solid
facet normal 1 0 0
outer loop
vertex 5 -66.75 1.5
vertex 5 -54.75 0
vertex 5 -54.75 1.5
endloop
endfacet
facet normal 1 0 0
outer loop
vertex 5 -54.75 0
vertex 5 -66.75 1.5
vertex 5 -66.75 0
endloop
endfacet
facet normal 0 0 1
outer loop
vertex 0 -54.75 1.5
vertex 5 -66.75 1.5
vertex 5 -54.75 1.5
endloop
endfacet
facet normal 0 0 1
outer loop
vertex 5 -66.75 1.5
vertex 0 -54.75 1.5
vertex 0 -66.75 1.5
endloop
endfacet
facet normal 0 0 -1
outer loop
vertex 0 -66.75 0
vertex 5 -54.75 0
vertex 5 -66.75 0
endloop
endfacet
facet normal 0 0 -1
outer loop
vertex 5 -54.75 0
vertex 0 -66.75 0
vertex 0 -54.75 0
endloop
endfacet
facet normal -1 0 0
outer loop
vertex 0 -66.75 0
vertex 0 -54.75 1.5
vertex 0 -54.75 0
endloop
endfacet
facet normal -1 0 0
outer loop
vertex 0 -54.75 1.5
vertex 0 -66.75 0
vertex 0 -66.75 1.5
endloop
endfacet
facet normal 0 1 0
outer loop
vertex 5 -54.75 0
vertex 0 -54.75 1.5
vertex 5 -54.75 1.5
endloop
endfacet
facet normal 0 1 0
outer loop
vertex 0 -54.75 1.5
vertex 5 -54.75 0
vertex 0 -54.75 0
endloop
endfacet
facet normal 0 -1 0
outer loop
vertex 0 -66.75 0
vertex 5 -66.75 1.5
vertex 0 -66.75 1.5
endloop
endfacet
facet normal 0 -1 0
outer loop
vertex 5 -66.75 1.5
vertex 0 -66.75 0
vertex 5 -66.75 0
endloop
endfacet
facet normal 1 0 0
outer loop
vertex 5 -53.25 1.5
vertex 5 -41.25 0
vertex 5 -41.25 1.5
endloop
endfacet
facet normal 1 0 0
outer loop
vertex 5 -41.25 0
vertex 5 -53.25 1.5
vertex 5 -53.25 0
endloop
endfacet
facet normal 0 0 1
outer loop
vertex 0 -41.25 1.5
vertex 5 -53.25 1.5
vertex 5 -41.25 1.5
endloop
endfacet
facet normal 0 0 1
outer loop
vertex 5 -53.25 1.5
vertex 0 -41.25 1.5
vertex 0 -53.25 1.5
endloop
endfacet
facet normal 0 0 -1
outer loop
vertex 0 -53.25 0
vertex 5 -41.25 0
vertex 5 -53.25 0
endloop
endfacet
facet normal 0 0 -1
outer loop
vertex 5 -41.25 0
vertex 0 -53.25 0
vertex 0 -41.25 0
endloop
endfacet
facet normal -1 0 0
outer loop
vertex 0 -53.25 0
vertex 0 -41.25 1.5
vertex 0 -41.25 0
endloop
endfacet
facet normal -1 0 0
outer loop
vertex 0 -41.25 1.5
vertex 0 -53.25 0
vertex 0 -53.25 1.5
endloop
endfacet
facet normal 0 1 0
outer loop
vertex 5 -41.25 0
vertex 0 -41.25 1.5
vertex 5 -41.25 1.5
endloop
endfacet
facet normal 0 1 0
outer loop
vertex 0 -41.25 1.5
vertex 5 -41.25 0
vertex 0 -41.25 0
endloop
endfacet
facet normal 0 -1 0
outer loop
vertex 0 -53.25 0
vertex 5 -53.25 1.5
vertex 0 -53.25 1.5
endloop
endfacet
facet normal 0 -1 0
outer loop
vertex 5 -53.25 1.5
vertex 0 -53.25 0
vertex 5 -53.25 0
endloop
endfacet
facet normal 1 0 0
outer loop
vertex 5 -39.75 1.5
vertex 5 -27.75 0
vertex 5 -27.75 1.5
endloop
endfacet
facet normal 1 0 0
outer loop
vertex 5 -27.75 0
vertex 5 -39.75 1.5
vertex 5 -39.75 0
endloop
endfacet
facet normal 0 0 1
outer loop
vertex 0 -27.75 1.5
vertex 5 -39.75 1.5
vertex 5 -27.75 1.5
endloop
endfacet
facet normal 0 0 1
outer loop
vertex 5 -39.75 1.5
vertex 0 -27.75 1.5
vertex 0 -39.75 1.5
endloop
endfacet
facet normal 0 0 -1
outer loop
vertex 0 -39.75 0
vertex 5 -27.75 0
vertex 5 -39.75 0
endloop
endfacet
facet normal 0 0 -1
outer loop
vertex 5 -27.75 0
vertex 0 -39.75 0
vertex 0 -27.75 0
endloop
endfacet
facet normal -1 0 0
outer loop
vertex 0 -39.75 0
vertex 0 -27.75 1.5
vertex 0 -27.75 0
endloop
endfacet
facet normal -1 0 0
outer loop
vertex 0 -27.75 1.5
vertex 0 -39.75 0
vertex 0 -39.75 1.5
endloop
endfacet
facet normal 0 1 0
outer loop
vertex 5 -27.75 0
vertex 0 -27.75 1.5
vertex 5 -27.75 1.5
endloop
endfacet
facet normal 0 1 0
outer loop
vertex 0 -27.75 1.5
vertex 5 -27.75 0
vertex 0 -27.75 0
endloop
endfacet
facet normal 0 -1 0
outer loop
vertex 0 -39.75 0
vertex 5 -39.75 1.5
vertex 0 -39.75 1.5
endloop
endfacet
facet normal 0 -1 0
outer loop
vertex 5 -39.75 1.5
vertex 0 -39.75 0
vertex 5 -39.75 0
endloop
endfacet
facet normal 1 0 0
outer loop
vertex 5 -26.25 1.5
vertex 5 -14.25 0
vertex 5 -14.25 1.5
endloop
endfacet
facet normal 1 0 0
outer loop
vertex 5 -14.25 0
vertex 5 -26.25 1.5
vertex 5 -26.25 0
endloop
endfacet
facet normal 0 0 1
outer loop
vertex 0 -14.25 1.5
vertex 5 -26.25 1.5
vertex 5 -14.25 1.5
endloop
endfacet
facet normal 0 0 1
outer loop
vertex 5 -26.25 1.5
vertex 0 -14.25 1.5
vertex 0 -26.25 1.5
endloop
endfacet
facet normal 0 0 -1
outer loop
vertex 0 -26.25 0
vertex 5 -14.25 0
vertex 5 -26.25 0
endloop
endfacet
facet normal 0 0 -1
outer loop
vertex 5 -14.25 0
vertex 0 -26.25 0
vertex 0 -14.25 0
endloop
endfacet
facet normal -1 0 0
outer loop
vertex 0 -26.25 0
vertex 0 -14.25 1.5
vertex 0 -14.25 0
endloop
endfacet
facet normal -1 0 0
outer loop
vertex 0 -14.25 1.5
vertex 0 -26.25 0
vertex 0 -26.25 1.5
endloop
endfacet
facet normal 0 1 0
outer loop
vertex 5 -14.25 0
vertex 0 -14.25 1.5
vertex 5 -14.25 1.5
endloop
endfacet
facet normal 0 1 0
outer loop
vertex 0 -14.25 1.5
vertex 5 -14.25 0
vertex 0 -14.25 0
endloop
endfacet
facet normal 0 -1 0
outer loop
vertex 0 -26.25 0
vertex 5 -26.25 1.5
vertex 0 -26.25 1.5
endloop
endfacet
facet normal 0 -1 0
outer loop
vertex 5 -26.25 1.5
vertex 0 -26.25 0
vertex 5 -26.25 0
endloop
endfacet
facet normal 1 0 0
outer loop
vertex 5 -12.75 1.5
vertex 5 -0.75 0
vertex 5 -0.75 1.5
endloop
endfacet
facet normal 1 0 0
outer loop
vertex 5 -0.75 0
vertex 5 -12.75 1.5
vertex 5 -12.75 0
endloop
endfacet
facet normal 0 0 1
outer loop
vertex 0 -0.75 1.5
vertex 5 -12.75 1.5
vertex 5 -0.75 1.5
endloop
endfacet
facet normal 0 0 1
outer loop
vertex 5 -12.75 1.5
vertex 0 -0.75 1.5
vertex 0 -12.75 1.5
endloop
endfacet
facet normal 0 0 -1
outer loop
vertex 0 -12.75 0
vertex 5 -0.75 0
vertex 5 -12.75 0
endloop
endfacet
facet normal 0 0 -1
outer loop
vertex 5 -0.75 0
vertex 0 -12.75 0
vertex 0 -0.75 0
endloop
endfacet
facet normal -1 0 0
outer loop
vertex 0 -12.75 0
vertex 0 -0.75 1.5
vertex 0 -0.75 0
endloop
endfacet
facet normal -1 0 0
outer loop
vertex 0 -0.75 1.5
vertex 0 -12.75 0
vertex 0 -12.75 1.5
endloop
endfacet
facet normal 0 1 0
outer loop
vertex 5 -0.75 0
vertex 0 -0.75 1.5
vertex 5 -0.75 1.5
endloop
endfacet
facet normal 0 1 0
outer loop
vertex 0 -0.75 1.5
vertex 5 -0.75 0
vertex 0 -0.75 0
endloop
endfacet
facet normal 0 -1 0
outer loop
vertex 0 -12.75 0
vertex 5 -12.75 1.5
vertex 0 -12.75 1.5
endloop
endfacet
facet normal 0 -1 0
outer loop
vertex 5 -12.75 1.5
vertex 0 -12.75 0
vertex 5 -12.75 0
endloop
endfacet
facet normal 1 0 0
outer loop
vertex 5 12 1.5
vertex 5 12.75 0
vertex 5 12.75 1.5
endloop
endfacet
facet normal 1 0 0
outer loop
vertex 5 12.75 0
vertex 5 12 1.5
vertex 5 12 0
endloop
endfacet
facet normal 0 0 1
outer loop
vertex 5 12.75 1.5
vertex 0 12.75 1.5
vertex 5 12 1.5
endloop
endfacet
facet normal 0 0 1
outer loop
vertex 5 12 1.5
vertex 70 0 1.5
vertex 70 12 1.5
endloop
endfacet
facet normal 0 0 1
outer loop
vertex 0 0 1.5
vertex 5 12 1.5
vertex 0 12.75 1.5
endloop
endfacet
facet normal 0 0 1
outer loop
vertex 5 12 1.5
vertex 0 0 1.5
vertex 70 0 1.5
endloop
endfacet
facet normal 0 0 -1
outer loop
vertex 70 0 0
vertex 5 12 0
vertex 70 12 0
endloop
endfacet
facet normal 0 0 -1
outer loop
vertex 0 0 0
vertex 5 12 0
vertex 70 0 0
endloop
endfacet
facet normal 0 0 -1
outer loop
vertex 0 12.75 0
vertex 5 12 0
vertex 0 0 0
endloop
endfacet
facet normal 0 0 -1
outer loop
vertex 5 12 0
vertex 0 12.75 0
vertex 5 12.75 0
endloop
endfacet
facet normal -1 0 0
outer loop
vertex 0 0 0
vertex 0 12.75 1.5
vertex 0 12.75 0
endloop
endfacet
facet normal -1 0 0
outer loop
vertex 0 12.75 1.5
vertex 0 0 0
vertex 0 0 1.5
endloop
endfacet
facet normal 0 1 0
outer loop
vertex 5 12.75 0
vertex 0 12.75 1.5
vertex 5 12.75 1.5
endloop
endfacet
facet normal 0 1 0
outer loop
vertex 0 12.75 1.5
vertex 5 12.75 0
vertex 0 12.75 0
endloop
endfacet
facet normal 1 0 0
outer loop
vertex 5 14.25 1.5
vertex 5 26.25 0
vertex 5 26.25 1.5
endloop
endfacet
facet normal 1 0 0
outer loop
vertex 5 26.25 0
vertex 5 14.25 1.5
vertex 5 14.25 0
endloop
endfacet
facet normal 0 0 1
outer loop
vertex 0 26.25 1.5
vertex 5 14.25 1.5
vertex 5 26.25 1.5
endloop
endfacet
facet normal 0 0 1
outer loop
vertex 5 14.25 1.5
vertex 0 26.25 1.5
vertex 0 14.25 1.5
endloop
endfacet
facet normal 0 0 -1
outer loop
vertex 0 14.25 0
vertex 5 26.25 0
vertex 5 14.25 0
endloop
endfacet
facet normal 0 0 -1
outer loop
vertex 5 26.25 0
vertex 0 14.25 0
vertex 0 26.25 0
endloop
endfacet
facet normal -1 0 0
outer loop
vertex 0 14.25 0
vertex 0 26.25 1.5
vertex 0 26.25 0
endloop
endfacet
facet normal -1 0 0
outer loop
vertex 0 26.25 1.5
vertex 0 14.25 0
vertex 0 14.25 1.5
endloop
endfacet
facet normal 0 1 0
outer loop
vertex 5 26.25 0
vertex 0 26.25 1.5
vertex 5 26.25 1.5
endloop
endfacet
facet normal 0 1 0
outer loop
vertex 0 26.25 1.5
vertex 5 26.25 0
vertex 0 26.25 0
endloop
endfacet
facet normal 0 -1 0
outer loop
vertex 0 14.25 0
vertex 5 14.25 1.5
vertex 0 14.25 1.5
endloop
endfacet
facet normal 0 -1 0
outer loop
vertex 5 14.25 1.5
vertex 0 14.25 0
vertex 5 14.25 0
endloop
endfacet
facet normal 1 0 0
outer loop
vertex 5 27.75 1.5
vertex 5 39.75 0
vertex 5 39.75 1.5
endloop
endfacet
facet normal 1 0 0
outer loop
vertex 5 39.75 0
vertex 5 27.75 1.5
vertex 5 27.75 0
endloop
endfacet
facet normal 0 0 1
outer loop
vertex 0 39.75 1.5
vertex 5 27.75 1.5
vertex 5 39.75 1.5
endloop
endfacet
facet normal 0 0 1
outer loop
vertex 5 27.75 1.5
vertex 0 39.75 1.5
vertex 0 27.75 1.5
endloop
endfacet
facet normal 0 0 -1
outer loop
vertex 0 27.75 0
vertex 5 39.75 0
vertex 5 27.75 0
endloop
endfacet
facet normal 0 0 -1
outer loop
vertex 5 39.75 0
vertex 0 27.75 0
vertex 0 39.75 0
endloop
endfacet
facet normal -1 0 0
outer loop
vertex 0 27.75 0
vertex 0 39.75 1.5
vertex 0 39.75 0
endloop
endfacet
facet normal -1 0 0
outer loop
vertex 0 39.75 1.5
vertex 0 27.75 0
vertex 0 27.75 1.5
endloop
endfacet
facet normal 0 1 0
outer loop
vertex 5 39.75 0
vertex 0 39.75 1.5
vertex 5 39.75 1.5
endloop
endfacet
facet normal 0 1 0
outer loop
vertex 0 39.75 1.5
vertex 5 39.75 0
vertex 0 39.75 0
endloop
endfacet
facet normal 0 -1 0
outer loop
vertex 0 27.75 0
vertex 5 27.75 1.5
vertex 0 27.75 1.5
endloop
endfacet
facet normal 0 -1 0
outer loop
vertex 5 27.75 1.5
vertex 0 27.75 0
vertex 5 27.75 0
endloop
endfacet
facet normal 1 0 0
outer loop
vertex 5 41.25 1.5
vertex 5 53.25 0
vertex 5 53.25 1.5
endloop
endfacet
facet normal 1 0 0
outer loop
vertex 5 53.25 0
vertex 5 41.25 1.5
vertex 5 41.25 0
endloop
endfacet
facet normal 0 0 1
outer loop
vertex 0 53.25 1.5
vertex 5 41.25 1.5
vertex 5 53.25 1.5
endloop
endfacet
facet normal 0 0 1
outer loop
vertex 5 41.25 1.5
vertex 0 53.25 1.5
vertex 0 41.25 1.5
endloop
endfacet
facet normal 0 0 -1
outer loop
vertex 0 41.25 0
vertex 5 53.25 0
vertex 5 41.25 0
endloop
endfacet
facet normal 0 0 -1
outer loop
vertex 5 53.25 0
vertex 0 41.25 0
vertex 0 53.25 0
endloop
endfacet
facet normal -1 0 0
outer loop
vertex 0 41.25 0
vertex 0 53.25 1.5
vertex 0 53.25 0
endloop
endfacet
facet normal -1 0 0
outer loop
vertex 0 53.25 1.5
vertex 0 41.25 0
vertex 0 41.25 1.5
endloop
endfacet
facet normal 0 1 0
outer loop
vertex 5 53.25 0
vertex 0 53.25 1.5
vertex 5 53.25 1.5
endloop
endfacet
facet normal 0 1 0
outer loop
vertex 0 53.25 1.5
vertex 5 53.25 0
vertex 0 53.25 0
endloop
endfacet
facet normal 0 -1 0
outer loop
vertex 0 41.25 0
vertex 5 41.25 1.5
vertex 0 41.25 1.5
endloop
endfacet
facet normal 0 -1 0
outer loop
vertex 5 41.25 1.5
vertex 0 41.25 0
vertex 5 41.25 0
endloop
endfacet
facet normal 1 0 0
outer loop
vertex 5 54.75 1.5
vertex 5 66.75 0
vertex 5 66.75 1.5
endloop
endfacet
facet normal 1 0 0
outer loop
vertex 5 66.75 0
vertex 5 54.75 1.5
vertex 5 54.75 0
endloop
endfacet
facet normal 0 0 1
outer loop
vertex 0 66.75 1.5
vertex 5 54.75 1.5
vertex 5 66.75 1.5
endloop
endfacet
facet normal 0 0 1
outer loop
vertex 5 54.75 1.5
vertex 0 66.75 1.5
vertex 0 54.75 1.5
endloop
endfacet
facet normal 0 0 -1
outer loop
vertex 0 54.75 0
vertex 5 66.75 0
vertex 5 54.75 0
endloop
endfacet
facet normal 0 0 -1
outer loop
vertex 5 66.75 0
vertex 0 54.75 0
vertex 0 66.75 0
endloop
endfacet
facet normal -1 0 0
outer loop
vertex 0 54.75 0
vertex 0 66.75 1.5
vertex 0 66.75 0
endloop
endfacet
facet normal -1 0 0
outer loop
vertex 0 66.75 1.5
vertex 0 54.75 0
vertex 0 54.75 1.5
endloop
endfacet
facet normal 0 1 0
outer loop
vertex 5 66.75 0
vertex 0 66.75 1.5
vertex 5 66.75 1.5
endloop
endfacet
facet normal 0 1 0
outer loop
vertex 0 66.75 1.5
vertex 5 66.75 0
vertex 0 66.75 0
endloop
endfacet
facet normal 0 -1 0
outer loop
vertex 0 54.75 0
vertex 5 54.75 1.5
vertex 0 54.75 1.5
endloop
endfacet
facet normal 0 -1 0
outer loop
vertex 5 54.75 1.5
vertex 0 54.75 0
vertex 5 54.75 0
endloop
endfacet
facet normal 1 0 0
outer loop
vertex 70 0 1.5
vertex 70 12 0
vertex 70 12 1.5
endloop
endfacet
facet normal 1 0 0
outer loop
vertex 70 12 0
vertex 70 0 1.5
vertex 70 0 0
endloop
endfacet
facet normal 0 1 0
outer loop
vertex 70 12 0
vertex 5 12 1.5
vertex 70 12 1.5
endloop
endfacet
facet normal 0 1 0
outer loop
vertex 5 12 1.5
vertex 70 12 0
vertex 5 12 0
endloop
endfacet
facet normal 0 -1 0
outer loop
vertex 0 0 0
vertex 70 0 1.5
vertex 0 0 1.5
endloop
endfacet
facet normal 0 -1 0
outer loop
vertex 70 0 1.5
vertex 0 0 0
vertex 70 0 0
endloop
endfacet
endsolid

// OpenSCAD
// Dimensions for 10-well comb for agarose gel casting
$fn = 64;

// Plate thickness (Z-direction, lying flat on bed)
plate_thickness = 1.5;

// Spine dimensions (back bar)
spine_length = 70;        // mm (X-direction)
spine_width = 12;         // mm (Y-direction)

// Tooth dimensions
tooth_width = 5.0;        // mm (X-direction)
tooth_length = 12;       // mm (Y-direction)
gap_between_teeth = 1.5; // mm

// Number of wells (teeth)
num_teeth = 10;

// Total length of the tooth row in Y direction (from first to last tooth)
total_length_y = (num_teeth - 1) * (tooth_length + gap_between_teeth) + tooth_length;
start_y = -total_length_y / 2;

// Create the full comb as a union of spine and teeth
union() {
    // Spine: 70 mm long (X), 12 mm wide (Y), 1.5 mm thick
    cube([spine_length, spine_width, plate_thickness]);

    // Each tooth extends from y = start_y + i*(tooth_length + gap) to y = start_y + i*(tooth_length + gap) + tooth_length
    for (i = [0 : num_teeth - 1]) {
        y_offset = start_y + i * (tooth_length + gap_between_teeth);
        // Each tooth is 5.0 mm wide (X), 12 mm long (Y), 1.5 mm thick
        // Positioned at (0, y_offset, 0) with orientation
        translate([0, y_offset, 0]) {
            cube([tooth_width, tooth_length, plate_thickness]);
        }
    }
}
